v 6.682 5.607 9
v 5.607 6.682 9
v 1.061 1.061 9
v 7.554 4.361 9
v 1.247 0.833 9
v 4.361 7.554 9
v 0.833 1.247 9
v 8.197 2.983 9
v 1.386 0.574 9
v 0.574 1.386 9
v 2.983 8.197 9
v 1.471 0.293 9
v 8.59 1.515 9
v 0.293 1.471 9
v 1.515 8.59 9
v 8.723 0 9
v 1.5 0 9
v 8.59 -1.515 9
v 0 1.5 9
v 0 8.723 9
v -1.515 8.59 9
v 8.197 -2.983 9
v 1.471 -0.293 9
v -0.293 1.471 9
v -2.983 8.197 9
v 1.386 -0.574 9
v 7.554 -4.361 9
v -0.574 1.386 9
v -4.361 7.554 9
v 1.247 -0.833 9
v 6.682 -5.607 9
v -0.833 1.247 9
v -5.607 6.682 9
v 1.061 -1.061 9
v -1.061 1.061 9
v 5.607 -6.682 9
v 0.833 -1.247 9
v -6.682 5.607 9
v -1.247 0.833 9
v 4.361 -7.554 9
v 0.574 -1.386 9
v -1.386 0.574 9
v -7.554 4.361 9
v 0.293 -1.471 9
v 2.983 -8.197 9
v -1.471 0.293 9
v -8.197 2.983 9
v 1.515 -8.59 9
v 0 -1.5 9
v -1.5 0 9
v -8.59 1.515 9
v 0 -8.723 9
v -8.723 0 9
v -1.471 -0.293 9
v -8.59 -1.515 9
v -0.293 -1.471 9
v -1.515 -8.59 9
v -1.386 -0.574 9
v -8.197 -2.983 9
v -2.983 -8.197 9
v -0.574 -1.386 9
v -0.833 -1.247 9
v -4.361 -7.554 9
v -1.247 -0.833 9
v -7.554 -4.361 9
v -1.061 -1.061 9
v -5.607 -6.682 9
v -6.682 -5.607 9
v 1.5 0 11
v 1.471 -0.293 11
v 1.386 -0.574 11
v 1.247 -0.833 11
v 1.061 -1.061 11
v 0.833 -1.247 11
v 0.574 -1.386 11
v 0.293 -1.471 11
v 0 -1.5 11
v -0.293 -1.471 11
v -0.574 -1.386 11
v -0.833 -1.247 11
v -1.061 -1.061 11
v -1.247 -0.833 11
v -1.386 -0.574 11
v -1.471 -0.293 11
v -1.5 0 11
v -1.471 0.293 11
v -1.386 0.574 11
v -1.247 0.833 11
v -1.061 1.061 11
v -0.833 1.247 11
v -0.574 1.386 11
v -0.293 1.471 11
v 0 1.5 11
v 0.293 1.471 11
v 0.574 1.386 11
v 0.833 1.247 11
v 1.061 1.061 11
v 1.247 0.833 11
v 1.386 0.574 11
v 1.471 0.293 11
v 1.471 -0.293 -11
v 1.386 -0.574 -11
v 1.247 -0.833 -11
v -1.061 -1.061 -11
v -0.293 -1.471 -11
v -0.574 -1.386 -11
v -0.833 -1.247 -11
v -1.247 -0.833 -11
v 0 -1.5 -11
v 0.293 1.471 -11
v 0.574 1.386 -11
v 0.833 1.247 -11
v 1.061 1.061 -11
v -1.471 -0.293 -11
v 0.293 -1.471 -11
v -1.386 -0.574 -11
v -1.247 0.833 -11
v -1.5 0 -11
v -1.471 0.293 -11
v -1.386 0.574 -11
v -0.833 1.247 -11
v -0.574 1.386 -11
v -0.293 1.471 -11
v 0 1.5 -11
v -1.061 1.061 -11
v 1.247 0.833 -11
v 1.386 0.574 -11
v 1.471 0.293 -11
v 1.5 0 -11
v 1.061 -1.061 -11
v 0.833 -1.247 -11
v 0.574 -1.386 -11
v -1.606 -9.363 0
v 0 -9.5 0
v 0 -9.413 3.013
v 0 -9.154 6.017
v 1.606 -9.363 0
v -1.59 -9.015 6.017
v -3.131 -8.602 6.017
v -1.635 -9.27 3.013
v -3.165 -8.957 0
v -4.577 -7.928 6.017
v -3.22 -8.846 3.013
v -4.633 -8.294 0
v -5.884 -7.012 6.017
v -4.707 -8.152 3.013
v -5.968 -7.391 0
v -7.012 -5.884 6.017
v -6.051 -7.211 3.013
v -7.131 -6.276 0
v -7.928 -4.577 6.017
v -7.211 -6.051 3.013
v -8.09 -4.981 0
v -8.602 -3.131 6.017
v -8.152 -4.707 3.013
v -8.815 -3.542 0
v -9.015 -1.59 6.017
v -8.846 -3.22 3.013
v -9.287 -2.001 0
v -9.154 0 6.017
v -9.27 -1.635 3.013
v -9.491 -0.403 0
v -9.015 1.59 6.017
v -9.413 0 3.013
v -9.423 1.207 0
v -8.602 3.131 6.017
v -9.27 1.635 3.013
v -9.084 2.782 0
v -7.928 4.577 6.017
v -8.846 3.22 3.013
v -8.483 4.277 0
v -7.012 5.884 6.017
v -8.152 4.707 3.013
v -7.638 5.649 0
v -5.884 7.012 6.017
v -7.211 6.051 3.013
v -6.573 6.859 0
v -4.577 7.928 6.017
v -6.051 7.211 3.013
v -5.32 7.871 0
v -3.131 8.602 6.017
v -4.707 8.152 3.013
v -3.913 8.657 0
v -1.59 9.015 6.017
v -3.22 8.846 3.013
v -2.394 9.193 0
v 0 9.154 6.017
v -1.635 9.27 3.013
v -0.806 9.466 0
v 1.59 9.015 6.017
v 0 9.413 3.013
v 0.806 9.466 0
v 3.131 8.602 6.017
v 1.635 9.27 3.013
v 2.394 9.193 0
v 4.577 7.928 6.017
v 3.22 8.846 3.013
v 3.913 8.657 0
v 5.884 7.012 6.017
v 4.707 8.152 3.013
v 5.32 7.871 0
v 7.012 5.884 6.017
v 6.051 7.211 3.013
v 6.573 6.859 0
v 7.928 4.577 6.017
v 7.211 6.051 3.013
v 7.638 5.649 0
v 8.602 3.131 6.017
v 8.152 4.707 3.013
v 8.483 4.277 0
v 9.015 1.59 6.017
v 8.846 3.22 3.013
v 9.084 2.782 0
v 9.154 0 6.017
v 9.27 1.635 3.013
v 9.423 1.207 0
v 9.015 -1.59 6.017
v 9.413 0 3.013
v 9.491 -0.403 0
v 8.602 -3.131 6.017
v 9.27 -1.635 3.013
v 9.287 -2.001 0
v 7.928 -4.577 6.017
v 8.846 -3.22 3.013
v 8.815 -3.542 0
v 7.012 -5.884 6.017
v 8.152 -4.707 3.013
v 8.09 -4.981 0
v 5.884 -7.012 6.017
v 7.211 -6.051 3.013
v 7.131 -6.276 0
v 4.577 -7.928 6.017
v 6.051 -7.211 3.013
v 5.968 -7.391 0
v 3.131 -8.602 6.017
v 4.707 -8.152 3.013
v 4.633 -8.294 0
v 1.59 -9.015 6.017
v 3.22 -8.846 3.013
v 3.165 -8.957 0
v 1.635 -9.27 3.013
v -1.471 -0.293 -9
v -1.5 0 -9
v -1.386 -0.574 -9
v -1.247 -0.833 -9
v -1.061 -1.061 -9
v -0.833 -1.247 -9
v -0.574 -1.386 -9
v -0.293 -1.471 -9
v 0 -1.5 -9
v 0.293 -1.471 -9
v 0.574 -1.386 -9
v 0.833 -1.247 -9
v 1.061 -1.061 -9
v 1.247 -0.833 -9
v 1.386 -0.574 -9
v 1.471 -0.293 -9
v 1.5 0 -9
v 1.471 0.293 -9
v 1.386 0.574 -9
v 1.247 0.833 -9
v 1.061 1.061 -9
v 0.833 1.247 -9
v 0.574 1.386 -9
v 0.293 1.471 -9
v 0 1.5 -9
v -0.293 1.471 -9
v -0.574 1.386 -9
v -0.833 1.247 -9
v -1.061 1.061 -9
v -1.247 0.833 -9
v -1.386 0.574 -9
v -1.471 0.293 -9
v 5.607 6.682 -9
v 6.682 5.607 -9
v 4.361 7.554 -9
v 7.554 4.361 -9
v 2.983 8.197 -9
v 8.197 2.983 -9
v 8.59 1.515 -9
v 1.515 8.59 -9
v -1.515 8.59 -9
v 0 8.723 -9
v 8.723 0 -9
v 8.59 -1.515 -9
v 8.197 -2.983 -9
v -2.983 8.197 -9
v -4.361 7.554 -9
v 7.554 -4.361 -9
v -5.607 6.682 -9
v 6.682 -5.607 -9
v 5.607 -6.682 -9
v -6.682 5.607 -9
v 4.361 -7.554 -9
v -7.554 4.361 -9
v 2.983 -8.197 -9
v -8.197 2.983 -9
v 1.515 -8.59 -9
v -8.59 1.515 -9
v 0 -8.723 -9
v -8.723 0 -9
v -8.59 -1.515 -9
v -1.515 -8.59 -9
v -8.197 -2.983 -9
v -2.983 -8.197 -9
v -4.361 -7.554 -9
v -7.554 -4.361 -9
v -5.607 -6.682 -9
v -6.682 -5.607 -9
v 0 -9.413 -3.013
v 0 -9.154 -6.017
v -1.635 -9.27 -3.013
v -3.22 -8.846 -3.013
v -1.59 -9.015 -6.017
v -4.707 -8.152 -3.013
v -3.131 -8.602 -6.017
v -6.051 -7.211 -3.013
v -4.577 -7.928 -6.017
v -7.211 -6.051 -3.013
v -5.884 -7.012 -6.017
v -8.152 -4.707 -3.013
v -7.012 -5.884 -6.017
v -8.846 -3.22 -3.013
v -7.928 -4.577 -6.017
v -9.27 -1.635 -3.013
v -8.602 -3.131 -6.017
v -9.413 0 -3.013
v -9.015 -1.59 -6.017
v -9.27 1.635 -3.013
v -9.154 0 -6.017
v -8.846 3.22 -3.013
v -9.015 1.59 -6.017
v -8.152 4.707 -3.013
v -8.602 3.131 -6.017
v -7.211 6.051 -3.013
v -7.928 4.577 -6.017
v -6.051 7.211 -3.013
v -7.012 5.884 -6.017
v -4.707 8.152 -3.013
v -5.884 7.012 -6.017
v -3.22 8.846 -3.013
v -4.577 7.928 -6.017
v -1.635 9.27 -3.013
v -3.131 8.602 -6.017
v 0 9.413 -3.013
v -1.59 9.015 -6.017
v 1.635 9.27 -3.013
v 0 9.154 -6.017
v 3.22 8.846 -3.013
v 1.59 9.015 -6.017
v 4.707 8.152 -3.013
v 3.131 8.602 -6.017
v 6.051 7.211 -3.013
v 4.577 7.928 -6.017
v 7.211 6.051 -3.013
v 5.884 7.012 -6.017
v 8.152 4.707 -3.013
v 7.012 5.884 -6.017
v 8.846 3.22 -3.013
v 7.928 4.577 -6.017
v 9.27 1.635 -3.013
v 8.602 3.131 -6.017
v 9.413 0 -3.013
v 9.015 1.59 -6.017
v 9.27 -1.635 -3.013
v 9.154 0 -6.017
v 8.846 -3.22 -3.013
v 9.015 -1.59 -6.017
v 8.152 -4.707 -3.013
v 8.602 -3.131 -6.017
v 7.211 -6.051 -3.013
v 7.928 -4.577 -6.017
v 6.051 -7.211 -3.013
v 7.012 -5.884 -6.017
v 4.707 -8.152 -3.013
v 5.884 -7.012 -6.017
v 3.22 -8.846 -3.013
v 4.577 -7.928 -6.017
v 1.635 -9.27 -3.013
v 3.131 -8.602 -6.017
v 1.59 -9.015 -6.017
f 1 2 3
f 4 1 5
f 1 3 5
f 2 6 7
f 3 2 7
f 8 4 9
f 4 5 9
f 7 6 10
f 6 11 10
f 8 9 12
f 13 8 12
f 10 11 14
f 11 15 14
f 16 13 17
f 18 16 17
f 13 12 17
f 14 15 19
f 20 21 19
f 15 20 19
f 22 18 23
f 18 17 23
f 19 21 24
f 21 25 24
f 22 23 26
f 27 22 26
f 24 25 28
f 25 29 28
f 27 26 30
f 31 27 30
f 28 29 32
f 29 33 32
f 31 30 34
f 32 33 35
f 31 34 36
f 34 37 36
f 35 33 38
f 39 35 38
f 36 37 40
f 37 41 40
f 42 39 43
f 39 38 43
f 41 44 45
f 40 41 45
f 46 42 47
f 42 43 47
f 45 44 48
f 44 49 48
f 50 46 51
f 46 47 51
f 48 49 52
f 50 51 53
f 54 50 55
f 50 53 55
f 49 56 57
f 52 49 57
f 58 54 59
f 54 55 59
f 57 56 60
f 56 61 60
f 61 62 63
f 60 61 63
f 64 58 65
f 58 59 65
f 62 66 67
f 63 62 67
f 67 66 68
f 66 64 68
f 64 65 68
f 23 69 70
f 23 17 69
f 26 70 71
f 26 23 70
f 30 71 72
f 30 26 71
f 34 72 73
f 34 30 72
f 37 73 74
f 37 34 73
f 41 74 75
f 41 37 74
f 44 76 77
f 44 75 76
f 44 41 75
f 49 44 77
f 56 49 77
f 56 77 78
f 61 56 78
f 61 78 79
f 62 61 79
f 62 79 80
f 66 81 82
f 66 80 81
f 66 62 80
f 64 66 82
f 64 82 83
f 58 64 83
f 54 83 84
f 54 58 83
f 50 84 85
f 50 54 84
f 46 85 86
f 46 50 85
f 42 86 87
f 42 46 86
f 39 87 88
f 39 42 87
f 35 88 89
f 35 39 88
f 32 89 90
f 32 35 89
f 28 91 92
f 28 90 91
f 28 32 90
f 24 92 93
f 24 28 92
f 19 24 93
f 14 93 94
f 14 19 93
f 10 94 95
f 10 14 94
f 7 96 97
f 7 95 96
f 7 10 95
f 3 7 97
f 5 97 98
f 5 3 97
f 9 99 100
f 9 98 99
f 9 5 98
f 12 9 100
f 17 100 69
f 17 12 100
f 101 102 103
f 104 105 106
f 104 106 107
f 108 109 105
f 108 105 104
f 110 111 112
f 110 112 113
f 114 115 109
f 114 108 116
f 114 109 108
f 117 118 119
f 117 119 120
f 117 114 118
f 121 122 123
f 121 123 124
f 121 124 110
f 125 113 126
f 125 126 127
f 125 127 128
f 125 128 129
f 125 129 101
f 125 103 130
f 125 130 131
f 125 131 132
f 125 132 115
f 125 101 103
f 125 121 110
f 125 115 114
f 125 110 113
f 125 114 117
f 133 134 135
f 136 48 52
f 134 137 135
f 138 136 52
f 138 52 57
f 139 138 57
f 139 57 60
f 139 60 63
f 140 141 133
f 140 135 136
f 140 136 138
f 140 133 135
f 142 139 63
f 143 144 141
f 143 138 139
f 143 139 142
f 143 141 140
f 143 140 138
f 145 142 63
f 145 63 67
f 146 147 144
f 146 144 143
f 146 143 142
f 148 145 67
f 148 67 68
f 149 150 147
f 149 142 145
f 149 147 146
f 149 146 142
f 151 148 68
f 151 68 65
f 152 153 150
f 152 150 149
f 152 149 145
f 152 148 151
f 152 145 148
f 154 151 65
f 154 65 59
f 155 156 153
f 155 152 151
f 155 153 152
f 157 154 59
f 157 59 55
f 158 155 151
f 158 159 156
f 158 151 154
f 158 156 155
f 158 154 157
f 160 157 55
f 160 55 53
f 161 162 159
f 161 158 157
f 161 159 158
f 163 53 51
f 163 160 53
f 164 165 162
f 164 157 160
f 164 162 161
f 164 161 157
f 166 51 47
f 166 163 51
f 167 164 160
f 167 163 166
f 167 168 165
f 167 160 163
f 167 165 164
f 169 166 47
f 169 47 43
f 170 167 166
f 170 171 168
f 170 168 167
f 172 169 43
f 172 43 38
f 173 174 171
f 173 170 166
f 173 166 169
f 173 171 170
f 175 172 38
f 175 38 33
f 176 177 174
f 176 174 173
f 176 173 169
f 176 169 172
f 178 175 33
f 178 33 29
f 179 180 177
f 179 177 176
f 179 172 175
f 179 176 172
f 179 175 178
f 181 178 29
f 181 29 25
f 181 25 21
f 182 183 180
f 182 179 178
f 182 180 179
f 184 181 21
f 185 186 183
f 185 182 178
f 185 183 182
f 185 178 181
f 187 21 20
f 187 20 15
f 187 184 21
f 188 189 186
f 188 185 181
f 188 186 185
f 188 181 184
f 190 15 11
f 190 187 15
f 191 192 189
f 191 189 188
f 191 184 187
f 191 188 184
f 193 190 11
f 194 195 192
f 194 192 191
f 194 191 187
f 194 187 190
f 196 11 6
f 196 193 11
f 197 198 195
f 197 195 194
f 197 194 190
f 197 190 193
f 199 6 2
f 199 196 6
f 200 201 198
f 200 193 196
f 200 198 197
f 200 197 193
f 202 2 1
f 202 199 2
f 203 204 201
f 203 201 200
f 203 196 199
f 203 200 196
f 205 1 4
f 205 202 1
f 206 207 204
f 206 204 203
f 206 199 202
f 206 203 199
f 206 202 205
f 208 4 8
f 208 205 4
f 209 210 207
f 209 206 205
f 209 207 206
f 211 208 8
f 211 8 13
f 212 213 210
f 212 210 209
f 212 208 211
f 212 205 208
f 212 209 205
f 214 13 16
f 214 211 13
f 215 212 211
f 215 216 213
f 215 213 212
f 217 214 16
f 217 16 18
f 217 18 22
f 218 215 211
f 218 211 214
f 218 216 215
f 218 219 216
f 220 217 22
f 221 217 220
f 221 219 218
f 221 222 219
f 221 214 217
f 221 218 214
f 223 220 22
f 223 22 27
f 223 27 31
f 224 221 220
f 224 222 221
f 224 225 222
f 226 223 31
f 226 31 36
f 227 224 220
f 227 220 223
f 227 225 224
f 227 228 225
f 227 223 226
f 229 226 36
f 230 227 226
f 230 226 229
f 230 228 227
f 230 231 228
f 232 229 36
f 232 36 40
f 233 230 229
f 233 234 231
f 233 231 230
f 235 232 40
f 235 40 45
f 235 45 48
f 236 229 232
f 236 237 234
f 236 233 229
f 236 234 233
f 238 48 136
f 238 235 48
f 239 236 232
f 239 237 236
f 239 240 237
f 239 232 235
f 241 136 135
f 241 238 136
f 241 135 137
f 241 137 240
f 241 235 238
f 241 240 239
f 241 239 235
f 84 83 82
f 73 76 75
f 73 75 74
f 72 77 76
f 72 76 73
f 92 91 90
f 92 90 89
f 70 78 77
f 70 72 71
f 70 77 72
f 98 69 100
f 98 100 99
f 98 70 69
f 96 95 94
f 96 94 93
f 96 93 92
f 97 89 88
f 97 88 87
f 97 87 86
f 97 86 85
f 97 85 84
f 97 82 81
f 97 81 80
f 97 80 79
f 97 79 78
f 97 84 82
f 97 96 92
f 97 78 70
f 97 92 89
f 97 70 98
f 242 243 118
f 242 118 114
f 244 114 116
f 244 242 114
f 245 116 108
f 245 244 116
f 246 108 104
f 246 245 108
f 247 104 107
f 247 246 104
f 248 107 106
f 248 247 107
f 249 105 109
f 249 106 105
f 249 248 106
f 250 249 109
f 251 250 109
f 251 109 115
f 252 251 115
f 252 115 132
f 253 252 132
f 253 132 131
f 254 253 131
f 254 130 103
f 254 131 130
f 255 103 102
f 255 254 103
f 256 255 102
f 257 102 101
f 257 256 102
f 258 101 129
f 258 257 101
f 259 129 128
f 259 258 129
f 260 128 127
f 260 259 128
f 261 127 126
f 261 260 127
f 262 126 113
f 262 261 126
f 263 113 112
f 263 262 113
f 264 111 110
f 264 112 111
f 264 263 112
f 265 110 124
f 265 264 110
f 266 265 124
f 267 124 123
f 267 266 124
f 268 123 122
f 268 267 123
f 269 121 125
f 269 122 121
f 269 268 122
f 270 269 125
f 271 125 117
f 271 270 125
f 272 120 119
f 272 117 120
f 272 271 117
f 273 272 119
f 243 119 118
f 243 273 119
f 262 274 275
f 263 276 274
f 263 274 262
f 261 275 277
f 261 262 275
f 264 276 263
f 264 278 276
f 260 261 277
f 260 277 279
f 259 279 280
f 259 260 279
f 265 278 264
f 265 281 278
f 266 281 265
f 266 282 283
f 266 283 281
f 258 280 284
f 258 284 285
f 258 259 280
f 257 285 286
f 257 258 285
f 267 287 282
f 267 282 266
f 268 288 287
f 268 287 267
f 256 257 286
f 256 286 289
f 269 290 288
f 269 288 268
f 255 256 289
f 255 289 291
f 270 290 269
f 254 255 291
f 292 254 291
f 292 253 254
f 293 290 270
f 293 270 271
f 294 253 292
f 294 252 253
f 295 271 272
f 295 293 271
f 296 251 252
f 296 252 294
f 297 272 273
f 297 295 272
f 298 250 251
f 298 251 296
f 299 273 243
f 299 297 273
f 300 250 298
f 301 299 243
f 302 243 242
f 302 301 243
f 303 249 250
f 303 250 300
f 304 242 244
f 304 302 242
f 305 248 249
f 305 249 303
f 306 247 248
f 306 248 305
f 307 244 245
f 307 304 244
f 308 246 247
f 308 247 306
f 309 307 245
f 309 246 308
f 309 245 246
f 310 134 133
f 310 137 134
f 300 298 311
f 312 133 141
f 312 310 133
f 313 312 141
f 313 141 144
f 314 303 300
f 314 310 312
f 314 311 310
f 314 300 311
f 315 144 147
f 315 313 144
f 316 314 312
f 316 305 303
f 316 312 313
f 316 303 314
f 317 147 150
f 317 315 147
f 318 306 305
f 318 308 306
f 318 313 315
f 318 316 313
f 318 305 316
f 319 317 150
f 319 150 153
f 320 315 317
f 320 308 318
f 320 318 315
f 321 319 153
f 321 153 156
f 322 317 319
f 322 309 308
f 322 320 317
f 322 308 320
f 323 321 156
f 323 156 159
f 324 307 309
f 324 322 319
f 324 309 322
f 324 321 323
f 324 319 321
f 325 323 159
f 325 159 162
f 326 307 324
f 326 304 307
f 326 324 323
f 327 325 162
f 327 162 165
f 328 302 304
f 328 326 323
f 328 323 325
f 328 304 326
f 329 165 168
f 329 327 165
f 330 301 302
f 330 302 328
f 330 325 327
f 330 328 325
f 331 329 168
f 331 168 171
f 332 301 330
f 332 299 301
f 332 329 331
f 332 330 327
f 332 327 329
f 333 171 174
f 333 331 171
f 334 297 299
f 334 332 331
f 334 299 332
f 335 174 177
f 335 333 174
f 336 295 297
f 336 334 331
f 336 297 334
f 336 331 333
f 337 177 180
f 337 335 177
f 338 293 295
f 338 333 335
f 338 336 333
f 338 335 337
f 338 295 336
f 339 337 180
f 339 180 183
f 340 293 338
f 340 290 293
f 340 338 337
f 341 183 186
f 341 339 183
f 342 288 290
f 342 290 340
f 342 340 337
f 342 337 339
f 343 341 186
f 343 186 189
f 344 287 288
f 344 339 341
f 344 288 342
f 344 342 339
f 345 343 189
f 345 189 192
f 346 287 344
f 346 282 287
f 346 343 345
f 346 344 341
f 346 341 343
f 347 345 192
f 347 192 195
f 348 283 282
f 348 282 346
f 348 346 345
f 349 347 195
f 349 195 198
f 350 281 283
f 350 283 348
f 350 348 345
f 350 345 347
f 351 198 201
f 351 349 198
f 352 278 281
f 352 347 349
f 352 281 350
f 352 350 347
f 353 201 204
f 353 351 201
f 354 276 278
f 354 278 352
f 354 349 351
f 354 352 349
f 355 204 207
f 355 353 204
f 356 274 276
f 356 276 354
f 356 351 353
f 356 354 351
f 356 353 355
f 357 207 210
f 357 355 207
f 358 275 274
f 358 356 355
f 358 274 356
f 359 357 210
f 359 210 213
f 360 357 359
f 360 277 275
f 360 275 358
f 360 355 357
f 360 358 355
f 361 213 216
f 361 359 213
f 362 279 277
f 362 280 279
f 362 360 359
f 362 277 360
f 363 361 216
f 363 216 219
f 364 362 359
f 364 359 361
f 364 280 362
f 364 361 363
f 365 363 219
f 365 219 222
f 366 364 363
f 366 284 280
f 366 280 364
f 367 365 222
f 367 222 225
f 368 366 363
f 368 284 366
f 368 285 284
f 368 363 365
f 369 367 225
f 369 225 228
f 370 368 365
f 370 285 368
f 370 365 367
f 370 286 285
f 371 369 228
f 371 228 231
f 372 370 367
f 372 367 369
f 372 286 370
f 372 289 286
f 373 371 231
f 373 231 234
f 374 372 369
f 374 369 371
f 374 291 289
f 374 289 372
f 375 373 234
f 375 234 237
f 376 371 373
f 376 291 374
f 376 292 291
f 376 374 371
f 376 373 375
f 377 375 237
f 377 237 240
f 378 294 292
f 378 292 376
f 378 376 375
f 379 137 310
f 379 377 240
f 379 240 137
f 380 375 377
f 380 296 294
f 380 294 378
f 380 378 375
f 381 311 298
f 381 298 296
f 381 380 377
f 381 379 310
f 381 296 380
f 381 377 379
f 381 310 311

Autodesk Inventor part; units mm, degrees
ref_plane "YZ Plane" through (0, 0, 0) normal (1, 0, 0) x (0, 1, 0)
ref_plane "XZ Plane" through (0, 0, 0) normal (0, 1, 0) x (-1, 0, 0)
ref_plane "XY Plane" through (0, 0, 0) normal (0, 0, 1) x (1, 0, 0)
sketch "スケッチ1" plane through (0, 0, 0) normal (1, 0, 0) x (0, 1, 0)
  line L0 (-9.5, -9) -> (9.5, -9)
  line L1 (9.5, -9) -> (9.5, 9)
  line L2 (9.5, 9) -> (-9.5, 9)
  line L3 (-9.5, 9) -> (-9.5, -9)
  line L4 (-9.5, -9) -> (9.5, 9) construction
  line L5 (9.5, -9) -> (-9.5, 9) construction
  circle A0 centre (-43, 0) radius 52.5
  line L6 (0, 0) -> (-43, 0) construction
  circle A1 centre (43, 0) radius 52.5
  line L7 (0, 9) -> (0, -9)
  point P0 (9.5, 0)
  point P1 (-9.5, 0)
  point P2 (-8.7228, 9)
  point P3 (-8.7228, -9)
  dimension "d2" = 105
  dimension "d3" = 105
  dimension "d0" = 19
  dimension "d1" = 18
revolve "回転1" add sketch "スケッチ1" angle 360 about axis through (0, 0, 9) along (0, 0, -1) contours A1 L2 L7 L0
sketch "スケッチ2" plane through (0, 0, 9) normal (0, 0, 1) x (1, 0, 0)
  circle A0 centre (0, 0) radius 1.5
  dimension "d5" = 3
sketch "スケッチ3" plane through (0, 0, -9) normal (0, 0, -1) x (-1, 0, 0)
  circle A0 centre (0, 0) radius 1.5
  dimension "d6" = 3
extrude "押し出し1" add sketch "スケッチ2" along normal blind 2
extrude "押し出し2" add sketch "スケッチ3" along normal blind 2
equation "\"d3\" = d2"
properties part number "omuni_rubber" material "ゴム"
